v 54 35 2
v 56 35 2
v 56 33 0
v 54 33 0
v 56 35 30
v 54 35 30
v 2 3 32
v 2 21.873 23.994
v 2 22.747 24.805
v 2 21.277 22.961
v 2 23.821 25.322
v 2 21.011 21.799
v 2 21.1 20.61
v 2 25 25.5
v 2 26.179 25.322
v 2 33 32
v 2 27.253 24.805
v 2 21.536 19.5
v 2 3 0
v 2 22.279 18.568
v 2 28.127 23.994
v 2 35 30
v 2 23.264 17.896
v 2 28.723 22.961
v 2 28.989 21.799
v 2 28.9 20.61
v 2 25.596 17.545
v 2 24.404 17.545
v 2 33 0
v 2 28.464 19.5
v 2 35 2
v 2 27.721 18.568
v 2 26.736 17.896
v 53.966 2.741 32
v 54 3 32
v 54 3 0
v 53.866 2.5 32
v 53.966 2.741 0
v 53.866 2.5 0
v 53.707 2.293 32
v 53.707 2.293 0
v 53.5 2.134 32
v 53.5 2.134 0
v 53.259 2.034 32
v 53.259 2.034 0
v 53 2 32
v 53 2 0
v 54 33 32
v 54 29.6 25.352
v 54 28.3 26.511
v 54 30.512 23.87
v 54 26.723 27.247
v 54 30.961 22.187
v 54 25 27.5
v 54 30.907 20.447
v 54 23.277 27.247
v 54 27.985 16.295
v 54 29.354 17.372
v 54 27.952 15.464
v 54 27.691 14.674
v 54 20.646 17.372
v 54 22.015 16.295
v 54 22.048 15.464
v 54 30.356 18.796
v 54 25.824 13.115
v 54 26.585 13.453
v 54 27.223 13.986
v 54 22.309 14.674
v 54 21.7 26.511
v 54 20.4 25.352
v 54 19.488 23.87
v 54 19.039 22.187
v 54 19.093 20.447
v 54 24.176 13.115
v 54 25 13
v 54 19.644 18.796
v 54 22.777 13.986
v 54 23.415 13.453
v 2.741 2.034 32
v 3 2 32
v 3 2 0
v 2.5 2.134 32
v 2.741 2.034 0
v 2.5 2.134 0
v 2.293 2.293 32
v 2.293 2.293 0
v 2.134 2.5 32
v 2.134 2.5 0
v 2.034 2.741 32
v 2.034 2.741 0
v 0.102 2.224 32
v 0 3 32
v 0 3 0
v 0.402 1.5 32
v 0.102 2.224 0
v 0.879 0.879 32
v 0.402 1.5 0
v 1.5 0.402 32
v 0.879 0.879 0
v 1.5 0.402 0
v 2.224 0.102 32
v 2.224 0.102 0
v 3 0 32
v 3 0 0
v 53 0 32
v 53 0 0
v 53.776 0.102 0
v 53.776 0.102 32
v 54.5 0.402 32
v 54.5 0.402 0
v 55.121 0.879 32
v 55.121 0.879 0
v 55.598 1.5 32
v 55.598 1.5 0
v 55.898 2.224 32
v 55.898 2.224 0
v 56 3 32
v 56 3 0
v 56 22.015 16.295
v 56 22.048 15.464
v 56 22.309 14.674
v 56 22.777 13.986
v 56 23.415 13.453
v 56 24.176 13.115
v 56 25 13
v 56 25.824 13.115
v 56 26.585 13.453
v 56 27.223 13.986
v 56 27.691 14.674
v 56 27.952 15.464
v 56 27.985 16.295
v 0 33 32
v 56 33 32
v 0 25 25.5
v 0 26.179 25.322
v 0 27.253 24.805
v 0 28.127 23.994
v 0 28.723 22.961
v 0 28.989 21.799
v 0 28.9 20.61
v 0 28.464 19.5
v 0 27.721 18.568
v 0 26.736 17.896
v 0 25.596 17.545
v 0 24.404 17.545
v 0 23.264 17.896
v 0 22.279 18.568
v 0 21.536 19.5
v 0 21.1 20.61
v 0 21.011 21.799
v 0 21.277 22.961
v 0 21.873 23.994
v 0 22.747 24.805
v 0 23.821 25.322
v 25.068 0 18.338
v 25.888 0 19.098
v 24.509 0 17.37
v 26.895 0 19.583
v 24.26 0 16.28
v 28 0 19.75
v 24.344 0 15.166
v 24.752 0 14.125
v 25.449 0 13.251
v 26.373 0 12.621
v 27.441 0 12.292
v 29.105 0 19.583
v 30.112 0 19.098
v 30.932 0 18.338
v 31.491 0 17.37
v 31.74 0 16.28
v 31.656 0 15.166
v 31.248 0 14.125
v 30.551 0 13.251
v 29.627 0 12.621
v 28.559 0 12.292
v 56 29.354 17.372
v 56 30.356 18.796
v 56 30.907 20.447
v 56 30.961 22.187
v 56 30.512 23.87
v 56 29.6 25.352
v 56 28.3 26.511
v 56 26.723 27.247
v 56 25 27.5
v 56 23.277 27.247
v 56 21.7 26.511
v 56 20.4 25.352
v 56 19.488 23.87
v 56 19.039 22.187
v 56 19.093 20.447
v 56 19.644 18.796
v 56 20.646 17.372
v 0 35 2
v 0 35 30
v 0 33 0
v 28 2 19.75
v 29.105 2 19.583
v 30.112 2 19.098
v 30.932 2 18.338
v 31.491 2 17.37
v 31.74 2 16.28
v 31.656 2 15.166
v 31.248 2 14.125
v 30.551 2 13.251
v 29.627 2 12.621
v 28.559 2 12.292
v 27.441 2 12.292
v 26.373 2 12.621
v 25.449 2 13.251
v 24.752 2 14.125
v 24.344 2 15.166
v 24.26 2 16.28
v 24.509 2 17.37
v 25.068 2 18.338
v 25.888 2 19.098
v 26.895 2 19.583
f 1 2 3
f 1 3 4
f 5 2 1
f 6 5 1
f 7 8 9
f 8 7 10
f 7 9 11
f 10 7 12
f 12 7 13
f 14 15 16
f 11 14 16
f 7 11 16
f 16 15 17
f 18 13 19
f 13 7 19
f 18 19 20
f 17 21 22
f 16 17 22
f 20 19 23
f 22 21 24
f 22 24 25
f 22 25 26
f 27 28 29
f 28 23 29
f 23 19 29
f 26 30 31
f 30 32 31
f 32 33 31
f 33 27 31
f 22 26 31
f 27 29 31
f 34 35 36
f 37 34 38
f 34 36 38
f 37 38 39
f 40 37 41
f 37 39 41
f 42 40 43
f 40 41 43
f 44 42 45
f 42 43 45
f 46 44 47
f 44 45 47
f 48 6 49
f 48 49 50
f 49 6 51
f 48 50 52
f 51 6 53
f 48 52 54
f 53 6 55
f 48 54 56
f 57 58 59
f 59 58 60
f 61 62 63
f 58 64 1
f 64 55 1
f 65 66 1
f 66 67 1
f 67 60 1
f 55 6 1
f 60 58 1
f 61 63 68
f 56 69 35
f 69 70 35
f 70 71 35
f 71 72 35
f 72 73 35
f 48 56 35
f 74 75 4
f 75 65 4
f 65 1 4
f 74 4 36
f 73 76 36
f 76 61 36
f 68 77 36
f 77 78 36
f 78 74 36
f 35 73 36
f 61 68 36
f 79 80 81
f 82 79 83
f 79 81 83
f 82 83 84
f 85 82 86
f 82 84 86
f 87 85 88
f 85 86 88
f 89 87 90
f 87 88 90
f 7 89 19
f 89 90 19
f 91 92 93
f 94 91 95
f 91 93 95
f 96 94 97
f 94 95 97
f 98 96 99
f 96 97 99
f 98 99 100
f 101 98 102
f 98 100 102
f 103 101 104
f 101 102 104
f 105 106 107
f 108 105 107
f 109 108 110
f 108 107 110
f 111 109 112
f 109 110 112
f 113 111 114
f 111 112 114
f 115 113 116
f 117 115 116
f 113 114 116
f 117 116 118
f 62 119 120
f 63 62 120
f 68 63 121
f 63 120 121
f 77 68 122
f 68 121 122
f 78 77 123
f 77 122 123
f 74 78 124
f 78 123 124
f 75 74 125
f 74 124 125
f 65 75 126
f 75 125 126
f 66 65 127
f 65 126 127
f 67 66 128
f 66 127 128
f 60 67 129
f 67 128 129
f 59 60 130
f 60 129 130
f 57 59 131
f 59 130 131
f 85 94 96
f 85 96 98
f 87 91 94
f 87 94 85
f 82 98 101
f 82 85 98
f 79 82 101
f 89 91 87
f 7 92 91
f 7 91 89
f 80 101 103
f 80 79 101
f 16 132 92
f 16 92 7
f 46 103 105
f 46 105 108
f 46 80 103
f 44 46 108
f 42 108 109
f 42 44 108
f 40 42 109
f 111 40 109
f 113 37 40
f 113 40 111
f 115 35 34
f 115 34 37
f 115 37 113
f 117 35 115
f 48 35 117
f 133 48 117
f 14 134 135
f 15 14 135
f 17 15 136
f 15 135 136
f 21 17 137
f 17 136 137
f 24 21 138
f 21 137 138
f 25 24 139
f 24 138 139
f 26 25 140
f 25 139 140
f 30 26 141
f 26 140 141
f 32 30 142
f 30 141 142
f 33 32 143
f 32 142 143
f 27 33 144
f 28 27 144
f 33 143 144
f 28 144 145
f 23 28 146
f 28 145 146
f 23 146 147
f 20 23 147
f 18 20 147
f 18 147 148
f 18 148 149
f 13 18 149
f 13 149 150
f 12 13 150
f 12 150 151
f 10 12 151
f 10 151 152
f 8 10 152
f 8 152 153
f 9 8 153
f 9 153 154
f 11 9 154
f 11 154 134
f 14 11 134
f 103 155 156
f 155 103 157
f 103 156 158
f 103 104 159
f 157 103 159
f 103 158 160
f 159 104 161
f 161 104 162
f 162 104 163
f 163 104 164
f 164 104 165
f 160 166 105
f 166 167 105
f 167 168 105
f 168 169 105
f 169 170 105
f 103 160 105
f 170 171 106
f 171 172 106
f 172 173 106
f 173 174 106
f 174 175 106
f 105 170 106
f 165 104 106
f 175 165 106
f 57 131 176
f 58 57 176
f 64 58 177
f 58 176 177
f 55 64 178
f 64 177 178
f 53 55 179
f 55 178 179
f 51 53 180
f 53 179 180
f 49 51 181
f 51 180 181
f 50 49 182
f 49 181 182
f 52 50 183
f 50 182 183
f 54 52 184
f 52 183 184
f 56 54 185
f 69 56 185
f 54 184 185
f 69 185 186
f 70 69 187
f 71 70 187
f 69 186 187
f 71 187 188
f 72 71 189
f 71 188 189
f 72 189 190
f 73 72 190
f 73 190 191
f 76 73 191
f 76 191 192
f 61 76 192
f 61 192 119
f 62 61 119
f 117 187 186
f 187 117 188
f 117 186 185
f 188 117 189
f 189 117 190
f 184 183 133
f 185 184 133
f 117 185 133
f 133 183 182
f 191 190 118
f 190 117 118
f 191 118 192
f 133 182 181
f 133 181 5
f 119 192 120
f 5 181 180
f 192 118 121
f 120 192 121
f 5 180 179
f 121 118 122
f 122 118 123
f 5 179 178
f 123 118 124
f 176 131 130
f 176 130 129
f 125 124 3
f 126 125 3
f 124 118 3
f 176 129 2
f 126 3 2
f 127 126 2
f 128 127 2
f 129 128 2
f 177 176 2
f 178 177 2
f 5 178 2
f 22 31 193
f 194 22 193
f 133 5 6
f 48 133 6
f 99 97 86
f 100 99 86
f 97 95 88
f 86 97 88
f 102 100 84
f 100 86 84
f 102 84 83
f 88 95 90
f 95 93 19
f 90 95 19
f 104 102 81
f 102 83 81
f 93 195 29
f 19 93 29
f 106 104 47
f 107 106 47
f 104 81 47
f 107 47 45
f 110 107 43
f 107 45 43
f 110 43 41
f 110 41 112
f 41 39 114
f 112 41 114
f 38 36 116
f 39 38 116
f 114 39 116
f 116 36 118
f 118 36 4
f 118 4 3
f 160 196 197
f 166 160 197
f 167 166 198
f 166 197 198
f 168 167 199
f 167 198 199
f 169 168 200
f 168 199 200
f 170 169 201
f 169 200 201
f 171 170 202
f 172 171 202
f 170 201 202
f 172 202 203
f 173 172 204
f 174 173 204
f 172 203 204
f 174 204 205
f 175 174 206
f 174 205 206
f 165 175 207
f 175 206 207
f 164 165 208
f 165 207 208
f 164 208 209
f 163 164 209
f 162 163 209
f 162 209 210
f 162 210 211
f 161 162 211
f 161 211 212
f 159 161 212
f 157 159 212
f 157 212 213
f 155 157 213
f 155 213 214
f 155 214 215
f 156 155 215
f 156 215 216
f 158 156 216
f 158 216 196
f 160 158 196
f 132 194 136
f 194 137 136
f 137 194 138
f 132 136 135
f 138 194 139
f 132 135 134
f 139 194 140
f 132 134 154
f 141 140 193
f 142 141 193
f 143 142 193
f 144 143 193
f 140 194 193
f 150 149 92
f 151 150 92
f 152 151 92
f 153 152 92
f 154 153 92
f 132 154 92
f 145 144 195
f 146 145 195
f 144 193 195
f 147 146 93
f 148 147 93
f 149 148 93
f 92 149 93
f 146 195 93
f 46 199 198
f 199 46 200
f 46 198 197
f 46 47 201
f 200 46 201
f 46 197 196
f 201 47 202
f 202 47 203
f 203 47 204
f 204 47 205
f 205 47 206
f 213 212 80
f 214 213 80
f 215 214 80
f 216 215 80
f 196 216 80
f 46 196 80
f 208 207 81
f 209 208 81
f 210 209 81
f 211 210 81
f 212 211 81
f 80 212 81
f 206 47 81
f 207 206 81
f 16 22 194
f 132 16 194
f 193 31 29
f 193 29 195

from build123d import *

# Parameters (mm, degrees)
BASE_FLANGE1_DEPTH = 32
CUT_EXTRUDE1_DEPTH = 10
SKETCH7_R          = 4
CUT_EXTRUDE2_DEPTH = 10
SKETCH8_R          = 3.75
CUT_EXTRUDE4_DEPTH = 10
CHAMFER1_SIZE      = 2


# Read off the part's stored shape, not the designer's step: Base-Flange1
with BuildPart() as part:
    # Base-Flange1 outline → Base-Flange1 (new body)
    with BuildSketch(Plane.XY):
        with BuildLine():
            Line((56, 3), (56, 35))
            Line((56, 35), (54, 35))
            Line((54, 35), (54, 3))
            ThreePointArc((54, 3), (53.707106781, 2.292893219), (53, 2))
            Line((53, 2), (3, 2))
            ThreePointArc((3, 2), (2.292893219, 2.292893219), (2, 3))
            Line((2, 3), (2, 35))
            Line((2, 35), (0, 35))
            Line((0, 35), (0, 3))
            ThreePointArc((0, 3), (0.878679656, 0.878679656), (3, 0))
            Line((3, 0), (53, 0))
            ThreePointArc((53, 0), (55.121320344, 0.878679656), (56, 3))
        make_face()
    extrude(amount=BASE_FLANGE1_DEPTH)

    # Sketch6 → Cut-Extrude1 (cut)
    with BuildSketch(Plane(origin=(56, 0, 0), x_dir=(0, 0, -1), z_dir=(1, 0, 0))):
        with BuildLine():
            ThreePointArc((-16.295454545, 27.985415651), (-27.5, 25), (-16.295454545, 22.014584349))
            ThreePointArc((-16.295454545, 22.014584349), (-13, 25), (-16.295454545, 27.985415651))
        make_face()
    extrude(amount=-CUT_EXTRUDE1_DEPTH, mode=Mode.SUBTRACT)

    # Sketch7 → Cut-Extrude2 (cut)
    with BuildSketch(Plane.ZY):
        with Locations((21.5, 25)):
            Circle(SKETCH7_R)
    extrude(amount=-CUT_EXTRUDE2_DEPTH, mode=Mode.SUBTRACT)

    # Sketch8 → Cut-Extrude4 (cut)
    with BuildSketch(Plane(origin=(0, 2, 0), x_dir=(1, 0, 0), z_dir=(0, 1, 0))):
        with Locations(Location((28, -16, 0), (0, 0, 270))):
            Circle(SKETCH8_R)
    extrude(amount=-CUT_EXTRUDE4_DEPTH, mode=Mode.SUBTRACT)

    # Chamfer1
    chamfer1_edges = [part.edges().sort_by_distance(p)[0] for p in [
        (1, 35, 0),
        (55, 35, 0),
        (1, 35, 32),
        (55, 35, 32),
    ]]
    chamfer(chamfer1_edges, length=CHAMFER1_SIZE)


solid = part.part
